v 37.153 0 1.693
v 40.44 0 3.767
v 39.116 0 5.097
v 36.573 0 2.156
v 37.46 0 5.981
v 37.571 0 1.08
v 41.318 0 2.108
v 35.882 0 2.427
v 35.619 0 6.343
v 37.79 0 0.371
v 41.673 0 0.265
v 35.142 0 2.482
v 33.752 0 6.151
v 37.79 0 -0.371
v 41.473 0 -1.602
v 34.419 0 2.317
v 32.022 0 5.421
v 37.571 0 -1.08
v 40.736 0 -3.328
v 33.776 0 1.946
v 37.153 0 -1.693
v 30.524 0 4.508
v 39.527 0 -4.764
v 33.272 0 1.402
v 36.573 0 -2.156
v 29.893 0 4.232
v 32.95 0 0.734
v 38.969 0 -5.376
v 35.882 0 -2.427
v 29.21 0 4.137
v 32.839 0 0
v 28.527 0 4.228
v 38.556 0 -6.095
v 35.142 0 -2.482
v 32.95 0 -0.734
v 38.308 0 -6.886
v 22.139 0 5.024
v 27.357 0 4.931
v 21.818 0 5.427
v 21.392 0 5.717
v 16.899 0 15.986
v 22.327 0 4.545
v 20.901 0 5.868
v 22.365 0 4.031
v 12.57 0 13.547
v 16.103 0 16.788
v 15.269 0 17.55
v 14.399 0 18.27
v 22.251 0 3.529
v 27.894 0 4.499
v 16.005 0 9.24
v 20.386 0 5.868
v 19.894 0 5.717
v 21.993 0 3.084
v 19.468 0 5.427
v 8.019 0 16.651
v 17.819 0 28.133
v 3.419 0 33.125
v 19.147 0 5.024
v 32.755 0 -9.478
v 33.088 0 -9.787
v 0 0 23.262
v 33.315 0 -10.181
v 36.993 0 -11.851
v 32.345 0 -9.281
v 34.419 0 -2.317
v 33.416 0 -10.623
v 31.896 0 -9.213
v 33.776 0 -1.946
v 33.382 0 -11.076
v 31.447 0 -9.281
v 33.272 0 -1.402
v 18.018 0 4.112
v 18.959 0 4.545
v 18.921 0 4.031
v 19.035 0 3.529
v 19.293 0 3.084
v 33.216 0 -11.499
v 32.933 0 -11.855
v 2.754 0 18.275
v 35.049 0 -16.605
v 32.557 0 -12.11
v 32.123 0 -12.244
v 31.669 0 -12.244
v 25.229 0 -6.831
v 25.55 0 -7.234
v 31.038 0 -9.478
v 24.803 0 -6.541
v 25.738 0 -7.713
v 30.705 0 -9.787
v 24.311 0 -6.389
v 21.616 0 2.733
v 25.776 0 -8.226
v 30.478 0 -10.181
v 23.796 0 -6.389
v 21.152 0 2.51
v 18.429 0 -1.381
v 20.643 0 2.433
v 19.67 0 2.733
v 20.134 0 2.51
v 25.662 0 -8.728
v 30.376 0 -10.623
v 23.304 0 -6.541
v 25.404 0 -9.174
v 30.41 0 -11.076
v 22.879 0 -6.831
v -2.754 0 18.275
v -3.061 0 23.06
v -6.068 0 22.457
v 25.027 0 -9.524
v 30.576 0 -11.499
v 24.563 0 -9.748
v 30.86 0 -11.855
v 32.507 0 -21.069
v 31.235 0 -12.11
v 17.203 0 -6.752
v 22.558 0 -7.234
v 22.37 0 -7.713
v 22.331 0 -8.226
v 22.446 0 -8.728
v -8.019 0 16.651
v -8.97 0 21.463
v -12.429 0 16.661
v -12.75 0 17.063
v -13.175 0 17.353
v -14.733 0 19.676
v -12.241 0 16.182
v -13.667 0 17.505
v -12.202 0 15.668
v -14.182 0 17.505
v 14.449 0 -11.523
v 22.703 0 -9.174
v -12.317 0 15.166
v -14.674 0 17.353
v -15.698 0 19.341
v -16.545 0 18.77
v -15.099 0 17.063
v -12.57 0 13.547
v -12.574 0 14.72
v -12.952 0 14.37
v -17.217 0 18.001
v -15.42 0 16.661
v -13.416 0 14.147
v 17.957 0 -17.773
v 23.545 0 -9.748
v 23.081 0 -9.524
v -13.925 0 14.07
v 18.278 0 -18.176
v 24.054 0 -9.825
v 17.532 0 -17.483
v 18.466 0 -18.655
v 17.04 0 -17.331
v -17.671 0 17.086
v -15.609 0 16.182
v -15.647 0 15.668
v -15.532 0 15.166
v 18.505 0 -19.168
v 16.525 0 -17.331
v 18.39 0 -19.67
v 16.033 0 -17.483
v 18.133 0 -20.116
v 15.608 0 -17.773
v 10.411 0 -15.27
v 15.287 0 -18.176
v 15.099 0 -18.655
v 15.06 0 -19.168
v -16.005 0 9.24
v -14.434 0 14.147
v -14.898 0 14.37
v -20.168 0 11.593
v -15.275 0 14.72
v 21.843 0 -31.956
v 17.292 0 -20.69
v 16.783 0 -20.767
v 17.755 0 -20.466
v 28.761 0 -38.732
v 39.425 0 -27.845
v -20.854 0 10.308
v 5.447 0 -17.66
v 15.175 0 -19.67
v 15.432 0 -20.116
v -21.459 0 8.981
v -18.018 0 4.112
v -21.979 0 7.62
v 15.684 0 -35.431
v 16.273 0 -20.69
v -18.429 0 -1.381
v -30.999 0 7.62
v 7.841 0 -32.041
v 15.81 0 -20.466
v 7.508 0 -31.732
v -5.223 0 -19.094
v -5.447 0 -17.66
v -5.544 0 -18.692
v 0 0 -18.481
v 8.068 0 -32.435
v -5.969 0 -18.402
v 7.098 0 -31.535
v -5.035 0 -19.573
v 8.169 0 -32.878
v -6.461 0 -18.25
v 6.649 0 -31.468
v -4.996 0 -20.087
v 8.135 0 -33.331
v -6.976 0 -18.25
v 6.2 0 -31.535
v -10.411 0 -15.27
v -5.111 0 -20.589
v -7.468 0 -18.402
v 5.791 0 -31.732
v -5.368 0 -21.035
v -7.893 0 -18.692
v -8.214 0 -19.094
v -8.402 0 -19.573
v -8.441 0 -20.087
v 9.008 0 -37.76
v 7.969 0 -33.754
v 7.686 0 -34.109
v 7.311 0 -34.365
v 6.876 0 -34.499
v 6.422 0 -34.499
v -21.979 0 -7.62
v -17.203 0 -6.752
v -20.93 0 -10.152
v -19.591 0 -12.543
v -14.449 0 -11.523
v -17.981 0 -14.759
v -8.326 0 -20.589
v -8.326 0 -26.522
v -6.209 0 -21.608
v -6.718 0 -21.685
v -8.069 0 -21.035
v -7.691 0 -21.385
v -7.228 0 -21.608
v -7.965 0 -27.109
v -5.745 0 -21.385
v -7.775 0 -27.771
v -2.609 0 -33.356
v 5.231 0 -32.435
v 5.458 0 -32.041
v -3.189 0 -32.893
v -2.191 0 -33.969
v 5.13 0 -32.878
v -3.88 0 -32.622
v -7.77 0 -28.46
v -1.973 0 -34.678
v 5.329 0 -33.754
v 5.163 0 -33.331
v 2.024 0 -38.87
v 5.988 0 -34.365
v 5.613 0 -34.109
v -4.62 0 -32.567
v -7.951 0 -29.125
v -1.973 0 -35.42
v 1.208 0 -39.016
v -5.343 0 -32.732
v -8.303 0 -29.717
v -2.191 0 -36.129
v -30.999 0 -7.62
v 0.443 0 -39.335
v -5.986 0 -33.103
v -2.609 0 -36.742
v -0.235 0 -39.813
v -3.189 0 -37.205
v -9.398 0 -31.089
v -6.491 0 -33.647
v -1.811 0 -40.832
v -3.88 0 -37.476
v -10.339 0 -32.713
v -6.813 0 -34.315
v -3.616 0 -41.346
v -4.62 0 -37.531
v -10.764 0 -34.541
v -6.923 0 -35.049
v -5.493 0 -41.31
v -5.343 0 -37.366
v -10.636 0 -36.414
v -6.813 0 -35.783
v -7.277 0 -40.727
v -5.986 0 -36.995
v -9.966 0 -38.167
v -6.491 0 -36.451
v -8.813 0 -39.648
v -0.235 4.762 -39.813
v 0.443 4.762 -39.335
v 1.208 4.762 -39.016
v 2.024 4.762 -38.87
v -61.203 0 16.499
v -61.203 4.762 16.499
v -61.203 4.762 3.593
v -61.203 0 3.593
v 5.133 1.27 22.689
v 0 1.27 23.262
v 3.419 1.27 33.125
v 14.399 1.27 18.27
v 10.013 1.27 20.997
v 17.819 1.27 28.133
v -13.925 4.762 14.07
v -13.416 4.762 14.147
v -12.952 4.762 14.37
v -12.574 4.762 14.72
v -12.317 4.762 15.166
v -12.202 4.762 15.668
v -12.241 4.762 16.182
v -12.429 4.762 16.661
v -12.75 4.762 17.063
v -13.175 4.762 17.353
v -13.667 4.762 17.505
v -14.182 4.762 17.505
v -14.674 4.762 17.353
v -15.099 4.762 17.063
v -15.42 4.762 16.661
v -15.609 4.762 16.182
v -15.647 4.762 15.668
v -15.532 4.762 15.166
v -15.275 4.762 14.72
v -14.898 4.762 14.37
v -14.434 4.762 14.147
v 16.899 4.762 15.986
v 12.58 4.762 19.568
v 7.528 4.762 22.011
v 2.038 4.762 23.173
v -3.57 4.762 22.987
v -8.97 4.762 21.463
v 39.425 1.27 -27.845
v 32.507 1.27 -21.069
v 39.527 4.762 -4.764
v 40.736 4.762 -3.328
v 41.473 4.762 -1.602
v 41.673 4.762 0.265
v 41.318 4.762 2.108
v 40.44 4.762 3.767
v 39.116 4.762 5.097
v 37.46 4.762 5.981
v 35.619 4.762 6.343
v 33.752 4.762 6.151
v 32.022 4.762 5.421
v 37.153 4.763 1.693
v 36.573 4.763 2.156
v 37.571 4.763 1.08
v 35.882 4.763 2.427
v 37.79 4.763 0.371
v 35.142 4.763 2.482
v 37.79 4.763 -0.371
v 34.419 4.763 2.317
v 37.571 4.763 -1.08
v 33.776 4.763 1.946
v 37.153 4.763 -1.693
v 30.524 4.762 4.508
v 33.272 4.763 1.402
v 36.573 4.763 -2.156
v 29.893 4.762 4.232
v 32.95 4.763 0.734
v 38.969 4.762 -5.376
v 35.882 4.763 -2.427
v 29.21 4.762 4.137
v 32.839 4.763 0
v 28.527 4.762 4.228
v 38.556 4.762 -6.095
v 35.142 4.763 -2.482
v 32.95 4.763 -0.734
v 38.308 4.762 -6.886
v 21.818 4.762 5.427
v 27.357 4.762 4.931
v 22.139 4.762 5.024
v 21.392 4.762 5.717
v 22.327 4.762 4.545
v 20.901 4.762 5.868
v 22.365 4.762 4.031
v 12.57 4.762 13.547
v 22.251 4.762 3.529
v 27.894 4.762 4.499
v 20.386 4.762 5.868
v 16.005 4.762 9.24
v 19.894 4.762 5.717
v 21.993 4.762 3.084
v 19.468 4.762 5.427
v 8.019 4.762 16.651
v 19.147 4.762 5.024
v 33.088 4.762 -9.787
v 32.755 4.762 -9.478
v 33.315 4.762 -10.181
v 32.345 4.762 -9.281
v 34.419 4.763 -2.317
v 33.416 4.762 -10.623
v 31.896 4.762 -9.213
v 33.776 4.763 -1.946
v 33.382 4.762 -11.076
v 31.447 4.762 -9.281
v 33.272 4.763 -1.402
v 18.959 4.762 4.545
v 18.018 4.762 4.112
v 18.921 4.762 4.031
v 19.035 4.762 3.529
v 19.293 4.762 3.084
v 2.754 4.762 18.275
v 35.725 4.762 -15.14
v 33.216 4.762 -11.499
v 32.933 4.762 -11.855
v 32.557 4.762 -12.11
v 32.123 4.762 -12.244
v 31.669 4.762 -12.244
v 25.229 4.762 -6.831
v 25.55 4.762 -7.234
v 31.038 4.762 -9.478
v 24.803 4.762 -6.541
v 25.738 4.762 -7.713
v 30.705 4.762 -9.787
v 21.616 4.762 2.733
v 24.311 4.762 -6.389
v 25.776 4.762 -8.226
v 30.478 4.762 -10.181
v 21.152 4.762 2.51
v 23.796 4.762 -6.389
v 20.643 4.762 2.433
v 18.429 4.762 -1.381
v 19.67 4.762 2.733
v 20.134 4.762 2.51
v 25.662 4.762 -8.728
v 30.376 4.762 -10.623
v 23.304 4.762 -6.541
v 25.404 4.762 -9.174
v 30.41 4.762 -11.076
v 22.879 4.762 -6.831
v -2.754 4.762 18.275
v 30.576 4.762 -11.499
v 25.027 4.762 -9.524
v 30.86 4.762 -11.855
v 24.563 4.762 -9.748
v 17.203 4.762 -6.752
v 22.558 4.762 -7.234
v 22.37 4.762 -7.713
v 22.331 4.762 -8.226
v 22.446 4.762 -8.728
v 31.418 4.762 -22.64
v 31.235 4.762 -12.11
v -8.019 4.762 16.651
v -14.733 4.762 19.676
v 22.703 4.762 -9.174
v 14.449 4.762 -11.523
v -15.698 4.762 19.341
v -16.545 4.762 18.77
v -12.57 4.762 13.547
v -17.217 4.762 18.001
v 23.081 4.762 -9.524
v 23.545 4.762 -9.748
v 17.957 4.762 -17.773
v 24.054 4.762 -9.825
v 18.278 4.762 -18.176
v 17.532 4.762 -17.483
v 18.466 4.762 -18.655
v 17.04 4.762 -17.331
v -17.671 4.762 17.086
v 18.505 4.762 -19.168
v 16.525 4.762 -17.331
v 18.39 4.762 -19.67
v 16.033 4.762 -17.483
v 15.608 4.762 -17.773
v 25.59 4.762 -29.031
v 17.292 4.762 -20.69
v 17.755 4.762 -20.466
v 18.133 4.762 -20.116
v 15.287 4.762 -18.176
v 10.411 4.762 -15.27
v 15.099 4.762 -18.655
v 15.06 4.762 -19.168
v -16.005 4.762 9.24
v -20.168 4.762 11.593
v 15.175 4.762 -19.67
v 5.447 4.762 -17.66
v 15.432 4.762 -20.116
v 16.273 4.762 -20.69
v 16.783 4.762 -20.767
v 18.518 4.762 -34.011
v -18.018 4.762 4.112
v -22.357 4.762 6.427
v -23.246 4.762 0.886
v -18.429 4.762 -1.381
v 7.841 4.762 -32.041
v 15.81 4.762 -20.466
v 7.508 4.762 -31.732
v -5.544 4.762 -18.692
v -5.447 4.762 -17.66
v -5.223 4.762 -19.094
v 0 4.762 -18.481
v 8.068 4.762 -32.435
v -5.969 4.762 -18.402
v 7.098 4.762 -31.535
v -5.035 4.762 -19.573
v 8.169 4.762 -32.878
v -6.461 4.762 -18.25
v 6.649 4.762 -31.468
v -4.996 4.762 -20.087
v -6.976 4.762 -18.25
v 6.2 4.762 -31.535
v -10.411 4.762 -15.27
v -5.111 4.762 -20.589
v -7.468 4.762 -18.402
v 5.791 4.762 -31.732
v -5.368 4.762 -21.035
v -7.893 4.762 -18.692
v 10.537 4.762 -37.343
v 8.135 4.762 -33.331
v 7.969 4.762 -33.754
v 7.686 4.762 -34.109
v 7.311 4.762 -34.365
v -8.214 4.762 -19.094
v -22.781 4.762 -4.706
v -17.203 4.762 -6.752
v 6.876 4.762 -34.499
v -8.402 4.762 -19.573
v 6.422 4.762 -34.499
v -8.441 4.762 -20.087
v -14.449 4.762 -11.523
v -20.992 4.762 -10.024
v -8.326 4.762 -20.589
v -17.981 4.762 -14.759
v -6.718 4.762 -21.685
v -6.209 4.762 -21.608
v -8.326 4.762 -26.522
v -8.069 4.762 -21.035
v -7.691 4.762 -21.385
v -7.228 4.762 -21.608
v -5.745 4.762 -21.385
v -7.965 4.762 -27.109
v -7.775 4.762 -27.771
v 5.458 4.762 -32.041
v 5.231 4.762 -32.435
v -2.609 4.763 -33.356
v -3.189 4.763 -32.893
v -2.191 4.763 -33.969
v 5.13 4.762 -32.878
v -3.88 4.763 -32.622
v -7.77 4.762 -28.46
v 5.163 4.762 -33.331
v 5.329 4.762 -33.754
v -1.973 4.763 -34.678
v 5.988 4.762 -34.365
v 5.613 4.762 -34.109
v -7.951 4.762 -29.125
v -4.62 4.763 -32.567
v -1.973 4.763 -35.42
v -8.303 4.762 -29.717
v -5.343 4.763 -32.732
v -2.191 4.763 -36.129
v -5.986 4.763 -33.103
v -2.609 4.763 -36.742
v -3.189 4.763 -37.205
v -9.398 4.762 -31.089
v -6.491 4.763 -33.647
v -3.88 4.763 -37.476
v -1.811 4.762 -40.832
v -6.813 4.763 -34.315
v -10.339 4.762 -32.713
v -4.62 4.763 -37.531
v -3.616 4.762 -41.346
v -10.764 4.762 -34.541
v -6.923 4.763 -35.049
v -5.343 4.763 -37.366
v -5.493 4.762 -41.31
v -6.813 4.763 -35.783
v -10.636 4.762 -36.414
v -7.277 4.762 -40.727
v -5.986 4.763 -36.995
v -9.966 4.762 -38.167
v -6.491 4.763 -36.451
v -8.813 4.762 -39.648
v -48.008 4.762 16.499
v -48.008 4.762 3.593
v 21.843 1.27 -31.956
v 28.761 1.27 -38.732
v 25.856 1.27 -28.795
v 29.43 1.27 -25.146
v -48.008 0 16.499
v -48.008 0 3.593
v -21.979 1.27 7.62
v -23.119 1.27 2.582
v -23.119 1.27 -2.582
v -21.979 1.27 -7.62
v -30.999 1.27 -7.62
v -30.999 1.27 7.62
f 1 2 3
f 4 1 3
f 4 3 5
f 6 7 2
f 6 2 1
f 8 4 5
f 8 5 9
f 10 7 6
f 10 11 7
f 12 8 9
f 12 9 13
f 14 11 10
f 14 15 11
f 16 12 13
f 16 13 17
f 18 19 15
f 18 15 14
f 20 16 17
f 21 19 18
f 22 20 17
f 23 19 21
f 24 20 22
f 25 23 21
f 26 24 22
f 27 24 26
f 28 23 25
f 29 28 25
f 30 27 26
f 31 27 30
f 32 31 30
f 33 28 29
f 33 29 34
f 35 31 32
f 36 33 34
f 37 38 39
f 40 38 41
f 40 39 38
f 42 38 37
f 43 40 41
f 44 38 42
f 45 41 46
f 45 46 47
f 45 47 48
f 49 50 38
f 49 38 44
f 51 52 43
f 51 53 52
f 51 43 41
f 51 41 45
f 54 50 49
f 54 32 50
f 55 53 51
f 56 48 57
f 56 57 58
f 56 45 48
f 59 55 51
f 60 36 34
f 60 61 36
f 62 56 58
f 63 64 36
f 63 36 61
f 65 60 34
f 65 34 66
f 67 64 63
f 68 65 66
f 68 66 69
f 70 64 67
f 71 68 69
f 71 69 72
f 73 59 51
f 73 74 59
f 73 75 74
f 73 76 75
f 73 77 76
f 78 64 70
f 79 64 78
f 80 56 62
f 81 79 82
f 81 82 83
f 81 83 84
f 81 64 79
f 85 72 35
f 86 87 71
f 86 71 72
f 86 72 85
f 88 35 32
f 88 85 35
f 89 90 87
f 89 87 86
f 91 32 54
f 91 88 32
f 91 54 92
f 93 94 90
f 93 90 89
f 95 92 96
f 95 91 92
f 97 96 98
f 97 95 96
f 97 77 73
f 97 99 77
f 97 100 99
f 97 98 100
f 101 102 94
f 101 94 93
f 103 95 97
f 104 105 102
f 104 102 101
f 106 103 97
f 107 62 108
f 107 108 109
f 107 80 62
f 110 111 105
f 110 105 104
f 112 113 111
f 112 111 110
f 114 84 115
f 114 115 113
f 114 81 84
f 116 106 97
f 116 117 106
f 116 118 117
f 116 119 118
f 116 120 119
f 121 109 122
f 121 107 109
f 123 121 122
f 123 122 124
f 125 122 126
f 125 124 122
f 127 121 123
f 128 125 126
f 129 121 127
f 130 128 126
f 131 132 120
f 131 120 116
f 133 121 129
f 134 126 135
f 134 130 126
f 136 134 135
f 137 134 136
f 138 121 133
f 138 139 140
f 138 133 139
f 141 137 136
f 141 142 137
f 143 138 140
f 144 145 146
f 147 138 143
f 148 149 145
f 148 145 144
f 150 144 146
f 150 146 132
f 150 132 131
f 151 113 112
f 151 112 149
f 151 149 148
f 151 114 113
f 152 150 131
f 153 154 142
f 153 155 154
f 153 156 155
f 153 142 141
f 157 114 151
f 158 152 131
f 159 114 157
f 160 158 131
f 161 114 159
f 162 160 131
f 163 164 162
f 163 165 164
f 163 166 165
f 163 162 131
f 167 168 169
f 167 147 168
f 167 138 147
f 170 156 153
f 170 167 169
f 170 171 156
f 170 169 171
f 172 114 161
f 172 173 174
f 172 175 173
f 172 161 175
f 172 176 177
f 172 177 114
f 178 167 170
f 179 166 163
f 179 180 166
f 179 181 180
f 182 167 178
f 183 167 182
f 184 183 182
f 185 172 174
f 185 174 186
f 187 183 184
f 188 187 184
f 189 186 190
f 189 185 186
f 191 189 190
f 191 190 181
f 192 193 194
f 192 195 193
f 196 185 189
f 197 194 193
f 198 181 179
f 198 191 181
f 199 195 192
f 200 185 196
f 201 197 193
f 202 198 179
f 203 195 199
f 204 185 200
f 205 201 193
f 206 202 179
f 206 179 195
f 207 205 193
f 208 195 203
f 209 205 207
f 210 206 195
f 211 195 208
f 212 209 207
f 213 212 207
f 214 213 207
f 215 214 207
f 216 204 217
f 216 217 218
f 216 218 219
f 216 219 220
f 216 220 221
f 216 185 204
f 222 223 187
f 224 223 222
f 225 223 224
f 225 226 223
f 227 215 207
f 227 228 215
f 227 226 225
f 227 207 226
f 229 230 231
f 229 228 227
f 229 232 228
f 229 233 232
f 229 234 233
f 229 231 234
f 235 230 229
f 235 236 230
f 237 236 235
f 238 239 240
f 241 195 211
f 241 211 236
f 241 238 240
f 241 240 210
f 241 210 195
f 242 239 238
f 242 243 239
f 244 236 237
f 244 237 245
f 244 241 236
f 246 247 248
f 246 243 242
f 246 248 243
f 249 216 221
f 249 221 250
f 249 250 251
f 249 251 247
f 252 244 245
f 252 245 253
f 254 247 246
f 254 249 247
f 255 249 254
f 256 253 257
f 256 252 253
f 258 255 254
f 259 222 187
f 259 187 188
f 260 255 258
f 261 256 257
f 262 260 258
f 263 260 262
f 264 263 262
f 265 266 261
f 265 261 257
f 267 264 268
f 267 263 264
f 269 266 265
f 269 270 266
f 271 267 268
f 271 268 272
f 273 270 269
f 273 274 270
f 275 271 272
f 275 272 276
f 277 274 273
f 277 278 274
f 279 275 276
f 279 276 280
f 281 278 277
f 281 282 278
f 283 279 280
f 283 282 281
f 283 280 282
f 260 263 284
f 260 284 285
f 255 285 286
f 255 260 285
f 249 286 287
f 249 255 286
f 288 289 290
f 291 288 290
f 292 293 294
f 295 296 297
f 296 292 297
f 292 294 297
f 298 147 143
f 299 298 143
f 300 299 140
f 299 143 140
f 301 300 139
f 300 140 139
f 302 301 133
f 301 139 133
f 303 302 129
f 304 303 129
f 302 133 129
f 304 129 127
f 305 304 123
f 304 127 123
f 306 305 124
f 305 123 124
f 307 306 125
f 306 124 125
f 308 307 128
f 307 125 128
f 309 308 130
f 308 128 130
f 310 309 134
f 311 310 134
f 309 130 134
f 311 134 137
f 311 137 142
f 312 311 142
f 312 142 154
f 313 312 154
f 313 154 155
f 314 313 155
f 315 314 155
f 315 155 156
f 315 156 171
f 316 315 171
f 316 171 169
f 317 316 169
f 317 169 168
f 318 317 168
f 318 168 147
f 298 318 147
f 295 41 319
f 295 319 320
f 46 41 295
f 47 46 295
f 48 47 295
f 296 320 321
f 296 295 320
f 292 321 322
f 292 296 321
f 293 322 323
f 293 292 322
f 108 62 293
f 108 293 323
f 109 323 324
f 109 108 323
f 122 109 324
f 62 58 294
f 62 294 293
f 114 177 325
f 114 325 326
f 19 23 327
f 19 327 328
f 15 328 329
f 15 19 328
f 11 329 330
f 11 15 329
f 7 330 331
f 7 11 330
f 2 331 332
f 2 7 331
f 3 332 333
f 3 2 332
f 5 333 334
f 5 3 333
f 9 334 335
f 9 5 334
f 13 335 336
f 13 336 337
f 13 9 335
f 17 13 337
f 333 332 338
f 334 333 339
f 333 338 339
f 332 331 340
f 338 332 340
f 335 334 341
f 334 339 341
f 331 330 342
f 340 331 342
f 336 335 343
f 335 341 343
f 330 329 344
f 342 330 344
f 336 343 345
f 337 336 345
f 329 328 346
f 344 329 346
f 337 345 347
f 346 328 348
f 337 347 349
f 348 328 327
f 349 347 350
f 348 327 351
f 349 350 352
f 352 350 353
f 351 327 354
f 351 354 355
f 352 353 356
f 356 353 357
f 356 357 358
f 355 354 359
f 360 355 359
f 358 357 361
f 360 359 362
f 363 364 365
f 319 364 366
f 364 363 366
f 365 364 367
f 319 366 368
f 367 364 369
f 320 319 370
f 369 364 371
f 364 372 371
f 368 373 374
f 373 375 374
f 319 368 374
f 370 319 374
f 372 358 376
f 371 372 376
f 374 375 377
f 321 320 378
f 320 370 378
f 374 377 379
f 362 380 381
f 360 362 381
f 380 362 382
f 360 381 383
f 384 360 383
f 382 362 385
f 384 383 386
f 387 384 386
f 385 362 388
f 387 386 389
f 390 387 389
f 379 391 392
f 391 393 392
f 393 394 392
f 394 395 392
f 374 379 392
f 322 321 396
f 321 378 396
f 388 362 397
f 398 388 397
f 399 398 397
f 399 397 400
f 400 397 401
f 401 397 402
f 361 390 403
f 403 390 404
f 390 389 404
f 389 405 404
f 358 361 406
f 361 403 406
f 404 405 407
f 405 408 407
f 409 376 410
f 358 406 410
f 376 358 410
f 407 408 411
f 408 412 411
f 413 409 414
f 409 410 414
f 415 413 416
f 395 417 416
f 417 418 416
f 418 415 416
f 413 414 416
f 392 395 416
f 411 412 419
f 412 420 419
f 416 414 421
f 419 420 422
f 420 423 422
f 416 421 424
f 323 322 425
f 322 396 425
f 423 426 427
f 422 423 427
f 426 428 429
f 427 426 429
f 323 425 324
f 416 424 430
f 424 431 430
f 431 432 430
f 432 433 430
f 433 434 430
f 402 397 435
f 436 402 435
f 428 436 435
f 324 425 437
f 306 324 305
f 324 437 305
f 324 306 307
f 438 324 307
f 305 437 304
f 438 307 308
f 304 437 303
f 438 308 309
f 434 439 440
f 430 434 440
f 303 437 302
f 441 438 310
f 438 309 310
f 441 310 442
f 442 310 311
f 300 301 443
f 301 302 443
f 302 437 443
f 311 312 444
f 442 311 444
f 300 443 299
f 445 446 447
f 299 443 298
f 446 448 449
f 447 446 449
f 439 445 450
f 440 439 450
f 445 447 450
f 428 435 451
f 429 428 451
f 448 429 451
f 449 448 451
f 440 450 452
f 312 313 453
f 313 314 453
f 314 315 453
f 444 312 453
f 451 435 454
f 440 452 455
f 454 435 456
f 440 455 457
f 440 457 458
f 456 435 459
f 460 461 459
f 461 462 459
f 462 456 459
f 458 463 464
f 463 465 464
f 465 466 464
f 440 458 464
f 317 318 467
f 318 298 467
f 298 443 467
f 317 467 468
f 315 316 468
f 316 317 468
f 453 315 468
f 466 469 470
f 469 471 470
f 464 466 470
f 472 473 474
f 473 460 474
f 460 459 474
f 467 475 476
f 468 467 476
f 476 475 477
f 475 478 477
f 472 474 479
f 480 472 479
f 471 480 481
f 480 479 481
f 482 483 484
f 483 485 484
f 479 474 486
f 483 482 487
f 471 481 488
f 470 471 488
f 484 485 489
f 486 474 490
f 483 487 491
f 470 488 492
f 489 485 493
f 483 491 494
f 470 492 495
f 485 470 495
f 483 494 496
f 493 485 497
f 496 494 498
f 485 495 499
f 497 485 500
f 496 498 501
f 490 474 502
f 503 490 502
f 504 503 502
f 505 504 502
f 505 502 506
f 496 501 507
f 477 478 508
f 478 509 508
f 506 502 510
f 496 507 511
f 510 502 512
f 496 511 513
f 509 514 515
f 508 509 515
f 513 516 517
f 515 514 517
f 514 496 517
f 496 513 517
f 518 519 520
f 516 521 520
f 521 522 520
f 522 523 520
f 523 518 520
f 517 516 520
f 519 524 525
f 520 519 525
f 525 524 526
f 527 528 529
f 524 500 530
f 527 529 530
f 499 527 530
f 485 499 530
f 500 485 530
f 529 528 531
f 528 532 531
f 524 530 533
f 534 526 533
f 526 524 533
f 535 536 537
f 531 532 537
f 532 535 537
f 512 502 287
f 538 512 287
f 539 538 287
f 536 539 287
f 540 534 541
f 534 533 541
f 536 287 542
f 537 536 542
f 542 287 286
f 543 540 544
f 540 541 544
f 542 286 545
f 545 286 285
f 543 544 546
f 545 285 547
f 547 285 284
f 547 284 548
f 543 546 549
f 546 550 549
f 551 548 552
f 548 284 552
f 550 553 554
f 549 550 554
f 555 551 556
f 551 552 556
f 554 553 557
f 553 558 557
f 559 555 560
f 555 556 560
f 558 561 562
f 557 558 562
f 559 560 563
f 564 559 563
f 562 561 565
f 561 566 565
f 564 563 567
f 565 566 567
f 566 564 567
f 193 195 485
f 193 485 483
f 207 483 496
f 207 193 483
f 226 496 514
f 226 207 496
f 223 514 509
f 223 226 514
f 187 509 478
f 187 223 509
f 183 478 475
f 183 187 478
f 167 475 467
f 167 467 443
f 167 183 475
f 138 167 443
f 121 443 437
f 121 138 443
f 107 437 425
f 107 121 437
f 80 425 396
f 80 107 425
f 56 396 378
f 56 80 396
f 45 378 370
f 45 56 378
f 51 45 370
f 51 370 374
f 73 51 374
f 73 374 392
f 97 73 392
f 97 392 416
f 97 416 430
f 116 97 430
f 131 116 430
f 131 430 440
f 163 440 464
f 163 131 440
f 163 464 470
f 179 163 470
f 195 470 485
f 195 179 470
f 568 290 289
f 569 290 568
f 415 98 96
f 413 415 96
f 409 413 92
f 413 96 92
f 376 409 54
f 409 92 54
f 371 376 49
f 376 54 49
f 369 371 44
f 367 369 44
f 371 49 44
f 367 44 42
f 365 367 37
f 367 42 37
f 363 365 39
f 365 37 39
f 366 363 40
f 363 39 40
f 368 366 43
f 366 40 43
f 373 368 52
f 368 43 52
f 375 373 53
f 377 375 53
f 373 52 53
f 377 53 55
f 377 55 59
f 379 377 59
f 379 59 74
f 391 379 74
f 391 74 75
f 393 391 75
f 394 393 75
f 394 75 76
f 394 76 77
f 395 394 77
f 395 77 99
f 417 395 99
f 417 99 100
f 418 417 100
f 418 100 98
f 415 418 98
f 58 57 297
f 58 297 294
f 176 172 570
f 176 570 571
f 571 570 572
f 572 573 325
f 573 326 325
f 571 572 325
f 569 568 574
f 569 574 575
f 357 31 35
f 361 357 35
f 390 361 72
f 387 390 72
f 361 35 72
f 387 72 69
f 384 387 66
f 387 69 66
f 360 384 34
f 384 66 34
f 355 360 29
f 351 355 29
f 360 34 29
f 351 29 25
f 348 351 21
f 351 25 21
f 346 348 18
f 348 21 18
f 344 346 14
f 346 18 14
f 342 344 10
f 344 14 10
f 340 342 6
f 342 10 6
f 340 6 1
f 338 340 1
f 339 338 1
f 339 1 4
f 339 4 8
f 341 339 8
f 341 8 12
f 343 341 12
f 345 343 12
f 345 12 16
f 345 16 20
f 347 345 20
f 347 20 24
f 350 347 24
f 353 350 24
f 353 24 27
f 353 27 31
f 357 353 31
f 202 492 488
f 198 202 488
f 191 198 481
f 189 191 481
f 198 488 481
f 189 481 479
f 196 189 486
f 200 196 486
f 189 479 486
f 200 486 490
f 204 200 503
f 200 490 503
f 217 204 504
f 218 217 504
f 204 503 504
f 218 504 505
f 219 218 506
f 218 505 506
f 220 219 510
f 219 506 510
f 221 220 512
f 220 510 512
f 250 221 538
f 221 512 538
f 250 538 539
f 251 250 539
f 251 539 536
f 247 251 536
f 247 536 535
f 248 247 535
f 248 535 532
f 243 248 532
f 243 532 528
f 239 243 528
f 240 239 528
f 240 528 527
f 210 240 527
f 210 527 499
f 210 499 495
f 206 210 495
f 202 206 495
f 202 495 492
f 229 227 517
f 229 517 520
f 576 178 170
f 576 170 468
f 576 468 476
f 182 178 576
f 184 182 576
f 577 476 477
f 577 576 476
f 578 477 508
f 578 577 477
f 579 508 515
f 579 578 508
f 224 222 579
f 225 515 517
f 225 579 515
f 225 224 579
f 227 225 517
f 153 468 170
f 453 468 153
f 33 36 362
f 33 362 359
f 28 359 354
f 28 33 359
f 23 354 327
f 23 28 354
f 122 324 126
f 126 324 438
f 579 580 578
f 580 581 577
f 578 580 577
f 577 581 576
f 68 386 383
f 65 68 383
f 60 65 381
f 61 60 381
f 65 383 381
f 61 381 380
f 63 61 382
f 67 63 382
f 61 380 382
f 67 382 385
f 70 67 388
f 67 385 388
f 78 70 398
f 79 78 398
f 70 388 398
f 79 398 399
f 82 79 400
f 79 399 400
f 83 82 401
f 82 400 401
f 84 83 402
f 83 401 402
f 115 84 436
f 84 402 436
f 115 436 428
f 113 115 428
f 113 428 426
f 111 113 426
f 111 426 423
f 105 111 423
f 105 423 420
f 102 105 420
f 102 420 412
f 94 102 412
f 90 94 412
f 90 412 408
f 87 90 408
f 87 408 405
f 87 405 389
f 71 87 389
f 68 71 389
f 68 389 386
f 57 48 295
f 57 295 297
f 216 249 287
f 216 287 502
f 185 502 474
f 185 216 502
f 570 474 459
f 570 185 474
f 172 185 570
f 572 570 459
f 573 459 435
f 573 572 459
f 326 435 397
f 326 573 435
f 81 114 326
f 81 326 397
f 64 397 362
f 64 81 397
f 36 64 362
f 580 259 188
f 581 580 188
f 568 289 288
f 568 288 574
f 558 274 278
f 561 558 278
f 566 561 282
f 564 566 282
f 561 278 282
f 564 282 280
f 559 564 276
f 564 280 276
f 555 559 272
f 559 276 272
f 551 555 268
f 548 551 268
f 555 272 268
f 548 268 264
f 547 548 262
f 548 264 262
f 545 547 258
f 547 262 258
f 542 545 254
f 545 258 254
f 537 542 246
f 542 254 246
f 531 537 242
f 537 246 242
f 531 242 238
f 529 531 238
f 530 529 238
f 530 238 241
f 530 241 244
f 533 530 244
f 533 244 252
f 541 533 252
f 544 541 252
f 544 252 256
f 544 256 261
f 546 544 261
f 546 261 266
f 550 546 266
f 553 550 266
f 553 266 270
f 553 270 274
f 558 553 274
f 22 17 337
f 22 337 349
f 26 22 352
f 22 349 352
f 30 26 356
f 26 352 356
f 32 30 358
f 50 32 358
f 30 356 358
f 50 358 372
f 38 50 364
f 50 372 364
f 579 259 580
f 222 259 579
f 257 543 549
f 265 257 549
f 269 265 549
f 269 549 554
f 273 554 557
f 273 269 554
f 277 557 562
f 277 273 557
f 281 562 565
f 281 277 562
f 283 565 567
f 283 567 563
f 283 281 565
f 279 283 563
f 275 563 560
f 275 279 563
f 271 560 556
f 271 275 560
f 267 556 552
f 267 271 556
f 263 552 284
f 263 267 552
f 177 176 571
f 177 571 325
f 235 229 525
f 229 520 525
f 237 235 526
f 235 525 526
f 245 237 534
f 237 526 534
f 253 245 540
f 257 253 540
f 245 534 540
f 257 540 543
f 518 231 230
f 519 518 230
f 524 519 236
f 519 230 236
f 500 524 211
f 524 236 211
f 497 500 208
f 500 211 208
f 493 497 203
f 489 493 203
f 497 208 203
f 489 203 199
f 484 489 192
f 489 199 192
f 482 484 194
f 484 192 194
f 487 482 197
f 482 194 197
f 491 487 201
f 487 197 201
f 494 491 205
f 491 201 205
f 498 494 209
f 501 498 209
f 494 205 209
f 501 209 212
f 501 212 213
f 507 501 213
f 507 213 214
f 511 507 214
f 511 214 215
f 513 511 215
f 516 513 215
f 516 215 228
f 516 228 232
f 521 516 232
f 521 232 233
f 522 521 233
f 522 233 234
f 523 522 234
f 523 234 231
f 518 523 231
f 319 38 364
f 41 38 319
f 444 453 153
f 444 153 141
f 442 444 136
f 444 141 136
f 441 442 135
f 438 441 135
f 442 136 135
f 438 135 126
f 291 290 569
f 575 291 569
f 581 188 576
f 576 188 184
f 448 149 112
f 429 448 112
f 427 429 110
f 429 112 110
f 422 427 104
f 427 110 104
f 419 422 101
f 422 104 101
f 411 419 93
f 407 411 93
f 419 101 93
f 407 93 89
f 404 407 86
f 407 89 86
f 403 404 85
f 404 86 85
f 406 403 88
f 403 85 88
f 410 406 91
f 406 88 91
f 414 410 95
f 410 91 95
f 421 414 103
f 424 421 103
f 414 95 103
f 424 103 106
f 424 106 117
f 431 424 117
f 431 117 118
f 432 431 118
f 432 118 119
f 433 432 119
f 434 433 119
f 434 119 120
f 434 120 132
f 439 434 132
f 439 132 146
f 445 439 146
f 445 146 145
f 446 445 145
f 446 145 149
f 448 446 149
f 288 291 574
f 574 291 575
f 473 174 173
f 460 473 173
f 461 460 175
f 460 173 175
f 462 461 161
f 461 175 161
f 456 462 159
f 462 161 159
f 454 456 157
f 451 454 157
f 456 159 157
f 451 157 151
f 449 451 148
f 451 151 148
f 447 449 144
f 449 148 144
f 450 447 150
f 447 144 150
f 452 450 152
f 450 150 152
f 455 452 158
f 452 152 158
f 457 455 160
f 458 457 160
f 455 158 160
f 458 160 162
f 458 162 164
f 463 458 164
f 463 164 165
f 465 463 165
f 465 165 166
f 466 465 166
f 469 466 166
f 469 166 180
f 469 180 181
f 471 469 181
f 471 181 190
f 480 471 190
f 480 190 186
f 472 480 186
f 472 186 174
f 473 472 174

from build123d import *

# Parameters (mm, degrees)
SKETCH1_R                 = 0.127
SKETCH1_R_2               = 18.480949957
BOSS_EXTRUDE1_DEPTH       = 4.7625
FILLET1_R                 = 2.54
F_10_CLEARANCE_HOLE1_D    = 4.9784
CUT_EXTRUDE1_REACH        = 60.938
SKETCH4_R                 = 1.524
F_8_32_TAPPED_HOLE1_D     = 3.4544
F_8_32_TAPPED_HOLE1_DEPTH = 10.7188
F_8_32_TAPPED_HOLE1_TIP   = 1.037806461
BOSS_EXTRUDE2_START       = -4.7625
BOSS_EXTRUDE2_DEPTH       = 4.7625
FILLET2_R                 = 31.75
SKETCH7_W                 = 13.194755421
SKETCH7_H                 = 12.906169147
BOSS_EXTRUDE3_DEPTH       = 4.7625
SKETCH8_W                 = 9.01972476
SKETCH8_H                 = 15.24
BOSS_EXTRUDE4_DEPTH       = 1.27


with BuildPart() as part:
    # Sketch1 → Boss-Extrude1 (new body)
    with BuildSketch(Plane(origin=(0, 0, 0), x_dir=(1, 0, 0), z_dir=(0, 1, 0))):
        with BuildLine():
            Line((32.022269256, -5.421481005), (28.769380653, -3.437844007))
            Line((28.769380653, -3.437844007), (16.899441567, -15.986018234))
            ThreePointArc((16.899441567, -15.986018234), (-15.382244428, -17.450801146), (-17.980601649, 14.759467084))
            Line((-17.980601649, 14.759467084), (-7.021401387, 28.11042435))
            Line((-7.021401387, 28.11042435), (-9.397611693, 31.088632634))
            ThreePointArc((-9.397611693, 31.088632634), (-8.812620694, 39.64785023), (-0.235016559, 39.812554878))
            ThreePointArc((-0.235016559, 39.812554878), (0.816557871, 39.154771525), (2.023694251, 38.869623355))
            ThreePointArc((2.023694251, 38.869623355), (25.590169938, 29.031456949), (38.308287357, 6.886078562))
            ThreePointArc((38.308287357, 6.886078562), (38.742684134, 5.724275154), (39.527245579, 4.763571735))
            ThreePointArc((39.527245579, 4.763571735), (40.440387397, -3.766879153), (32.022269256, -5.421481005))
        make_face()
        with Locations(Location((16.782521583, 19.039383247, 0), (0, 0, 270))):
            Circle(SKETCH1_R, mode=Mode.SUBTRACT)
        with Locations(Location((24.05378148, 8.097328768, 0), (0, 0, 270))):
            Circle(SKETCH1_R, mode=Mode.SUBTRACT)
        with Locations(Location((0, 0, 0), (0, 0, 90))):
            Circle(SKETCH1_R_2, mode=Mode.SUBTRACT)
    extrude(amount=BOSS_EXTRUDE1_DEPTH)

    # Fillet1
    fillet1_edges = [part.edges().sort_by_distance(p)[0] for p in [
        (-7.021401387, 2.38125, -28.11042435),
        (28.769380653, 2.38125, 3.437844007),
    ]]
    fillet(fillet1_edges, radius=FILLET1_R)

    # #10 Clearance Hole1 (through all)
    with Locations(Plane(origin=(0, 4.7625, 0), x_dir=(1, 0, 0), z_dir=(0, 1, 0))):
        with Locations((-4.433931219, 35.048983143), (35.328330918, 0)):
            Hole(F_10_CLEARANCE_HOLE1_D / 2)

    # Sketch4 → Cut-Extrude1 (cut, up to next)
    with BuildSketch(Plane(origin=(0, 4.7625, 0), x_dir=(1, 0, 0), z_dir=(0, 1, 0)), mode=Mode.PRIVATE) as cut_extrude1_sk1:
        with Locations(Location((6.649278755, 32.991606767, 0), (0, 0, 270))):
            Circle(SKETCH4_R)
    cut_extrude1_tool1 = extrude(cut_extrude1_sk1.sketch, amount=-CUT_EXTRUDE1_REACH, mode=Mode.PRIVATE) & part.part
    # Sketch4 → Cut-Extrude1 (cut, up to next)
    with BuildSketch(Plane(origin=(0, 4.7625, 0), x_dir=(1, 0, 0), z_dir=(0, 1, 0)), mode=Mode.PRIVATE) as cut_extrude1_sk2:
        with Locations(Location((31.896208949, 10.737359065, 0), (0, 0, 270))):
            Circle(SKETCH4_R)
    cut_extrude1_tool2 = extrude(cut_extrude1_sk2.sketch, amount=-CUT_EXTRUDE1_REACH, mode=Mode.PRIVATE) & part.part
    add(cut_extrude1_tool1.solids().sort_by_distance((6.649279, 4.7625, -32.991607))[0], mode=Mode.SUBTRACT)
    add(cut_extrude1_tool2.solids().sort_by_distance((31.896209, 4.7625, -10.737359))[0], mode=Mode.SUBTRACT)

    # #8-32 Tapped Hole1
    with Locations(Plane(origin=(-13.924641841, 4.7625, 15.797184665), x_dir=(0, 0, 1), z_dir=(0, 1, 0))):
        with Locations((0, 0), (-11.636683425, 34.56772599), (-35.754870571, 7.206199533), (-34.836567912, 30.707163424), (-23.894513433, 37.978423321)):
            Hole(F_8_32_TAPPED_HOLE1_D / 2, depth=F_8_32_TAPPED_HOLE1_DEPTH)
            with Locations((0, 0, -(F_8_32_TAPPED_HOLE1_DEPTH + F_8_32_TAPPED_HOLE1_TIP / 2))):  # 118° drill point
                Cone(0, F_8_32_TAPPED_HOLE1_D / 2, F_8_32_TAPPED_HOLE1_TIP, mode=Mode.SUBTRACT)

    # Sketch6 → Boss-Extrude2 (add)
    with BuildSketch(Plane(origin=(0, 4.7625, 0), x_dir=(1, 0, 0), z_dir=(0, 1, 0)).offset(BOSS_EXTRUDE2_START)):
        with BuildLine():
            ThreePointArc((-17.800942693, -14.975658365), (-16.544764589, -18.769653428), (-12.623110984, -19.539728077))
            ThreePointArc((-12.623110984, -19.539728077), (-15.382244428, -17.450801146), (-17.800942693, -14.975658365))
        make_face()
    extrude(amount=BOSS_EXTRUDE2_DEPTH)

    # Fillet2
    fillet2_edges = [part.edges().sort_by_distance(p)[0] for p in [
        (-17.800942693, 2.38125, 14.975658365),
        (-12.623110984, 2.38125, 19.539728077),
    ]]
    fillet(fillet2_edges, radius=FILLET2_R)

    # Sketch8 → Boss-Extrude4 (add)
    with BuildSketch(Plane.XZ):
        Polygon((0, 23.262499957), (14.399184208, 18.270396777), (17.818505689, 28.133061492), (3.419321482, 33.125164672), align=None)
        with Locations((-26.488932066, 0)):
            Rectangle(SKETCH8_W, SKETCH8_H)
        Polygon((32.507450275, -21.068755629), (21.842927659, -31.955699984), (28.760500103, -38.731945492), (39.425022719, -27.845001137), align=None)
    extrude(amount=-BOSS_EXTRUDE4_DEPTH)


with BuildPart() as body_2:
    # Sketch7 → Boss-Extrude3 (new body)
    with BuildSketch(Plane(origin=(0, 4.7625, 0), x_dir=(1, 0, 0), z_dir=(0, 1, 0))):
        with Locations((-54.605402604, -10.046163605)):
            Rectangle(SKETCH7_W, SKETCH7_H)
    extrude(amount=-BOSS_EXTRUDE3_DEPTH)


solid = Compound([part.part, body_2.part])
